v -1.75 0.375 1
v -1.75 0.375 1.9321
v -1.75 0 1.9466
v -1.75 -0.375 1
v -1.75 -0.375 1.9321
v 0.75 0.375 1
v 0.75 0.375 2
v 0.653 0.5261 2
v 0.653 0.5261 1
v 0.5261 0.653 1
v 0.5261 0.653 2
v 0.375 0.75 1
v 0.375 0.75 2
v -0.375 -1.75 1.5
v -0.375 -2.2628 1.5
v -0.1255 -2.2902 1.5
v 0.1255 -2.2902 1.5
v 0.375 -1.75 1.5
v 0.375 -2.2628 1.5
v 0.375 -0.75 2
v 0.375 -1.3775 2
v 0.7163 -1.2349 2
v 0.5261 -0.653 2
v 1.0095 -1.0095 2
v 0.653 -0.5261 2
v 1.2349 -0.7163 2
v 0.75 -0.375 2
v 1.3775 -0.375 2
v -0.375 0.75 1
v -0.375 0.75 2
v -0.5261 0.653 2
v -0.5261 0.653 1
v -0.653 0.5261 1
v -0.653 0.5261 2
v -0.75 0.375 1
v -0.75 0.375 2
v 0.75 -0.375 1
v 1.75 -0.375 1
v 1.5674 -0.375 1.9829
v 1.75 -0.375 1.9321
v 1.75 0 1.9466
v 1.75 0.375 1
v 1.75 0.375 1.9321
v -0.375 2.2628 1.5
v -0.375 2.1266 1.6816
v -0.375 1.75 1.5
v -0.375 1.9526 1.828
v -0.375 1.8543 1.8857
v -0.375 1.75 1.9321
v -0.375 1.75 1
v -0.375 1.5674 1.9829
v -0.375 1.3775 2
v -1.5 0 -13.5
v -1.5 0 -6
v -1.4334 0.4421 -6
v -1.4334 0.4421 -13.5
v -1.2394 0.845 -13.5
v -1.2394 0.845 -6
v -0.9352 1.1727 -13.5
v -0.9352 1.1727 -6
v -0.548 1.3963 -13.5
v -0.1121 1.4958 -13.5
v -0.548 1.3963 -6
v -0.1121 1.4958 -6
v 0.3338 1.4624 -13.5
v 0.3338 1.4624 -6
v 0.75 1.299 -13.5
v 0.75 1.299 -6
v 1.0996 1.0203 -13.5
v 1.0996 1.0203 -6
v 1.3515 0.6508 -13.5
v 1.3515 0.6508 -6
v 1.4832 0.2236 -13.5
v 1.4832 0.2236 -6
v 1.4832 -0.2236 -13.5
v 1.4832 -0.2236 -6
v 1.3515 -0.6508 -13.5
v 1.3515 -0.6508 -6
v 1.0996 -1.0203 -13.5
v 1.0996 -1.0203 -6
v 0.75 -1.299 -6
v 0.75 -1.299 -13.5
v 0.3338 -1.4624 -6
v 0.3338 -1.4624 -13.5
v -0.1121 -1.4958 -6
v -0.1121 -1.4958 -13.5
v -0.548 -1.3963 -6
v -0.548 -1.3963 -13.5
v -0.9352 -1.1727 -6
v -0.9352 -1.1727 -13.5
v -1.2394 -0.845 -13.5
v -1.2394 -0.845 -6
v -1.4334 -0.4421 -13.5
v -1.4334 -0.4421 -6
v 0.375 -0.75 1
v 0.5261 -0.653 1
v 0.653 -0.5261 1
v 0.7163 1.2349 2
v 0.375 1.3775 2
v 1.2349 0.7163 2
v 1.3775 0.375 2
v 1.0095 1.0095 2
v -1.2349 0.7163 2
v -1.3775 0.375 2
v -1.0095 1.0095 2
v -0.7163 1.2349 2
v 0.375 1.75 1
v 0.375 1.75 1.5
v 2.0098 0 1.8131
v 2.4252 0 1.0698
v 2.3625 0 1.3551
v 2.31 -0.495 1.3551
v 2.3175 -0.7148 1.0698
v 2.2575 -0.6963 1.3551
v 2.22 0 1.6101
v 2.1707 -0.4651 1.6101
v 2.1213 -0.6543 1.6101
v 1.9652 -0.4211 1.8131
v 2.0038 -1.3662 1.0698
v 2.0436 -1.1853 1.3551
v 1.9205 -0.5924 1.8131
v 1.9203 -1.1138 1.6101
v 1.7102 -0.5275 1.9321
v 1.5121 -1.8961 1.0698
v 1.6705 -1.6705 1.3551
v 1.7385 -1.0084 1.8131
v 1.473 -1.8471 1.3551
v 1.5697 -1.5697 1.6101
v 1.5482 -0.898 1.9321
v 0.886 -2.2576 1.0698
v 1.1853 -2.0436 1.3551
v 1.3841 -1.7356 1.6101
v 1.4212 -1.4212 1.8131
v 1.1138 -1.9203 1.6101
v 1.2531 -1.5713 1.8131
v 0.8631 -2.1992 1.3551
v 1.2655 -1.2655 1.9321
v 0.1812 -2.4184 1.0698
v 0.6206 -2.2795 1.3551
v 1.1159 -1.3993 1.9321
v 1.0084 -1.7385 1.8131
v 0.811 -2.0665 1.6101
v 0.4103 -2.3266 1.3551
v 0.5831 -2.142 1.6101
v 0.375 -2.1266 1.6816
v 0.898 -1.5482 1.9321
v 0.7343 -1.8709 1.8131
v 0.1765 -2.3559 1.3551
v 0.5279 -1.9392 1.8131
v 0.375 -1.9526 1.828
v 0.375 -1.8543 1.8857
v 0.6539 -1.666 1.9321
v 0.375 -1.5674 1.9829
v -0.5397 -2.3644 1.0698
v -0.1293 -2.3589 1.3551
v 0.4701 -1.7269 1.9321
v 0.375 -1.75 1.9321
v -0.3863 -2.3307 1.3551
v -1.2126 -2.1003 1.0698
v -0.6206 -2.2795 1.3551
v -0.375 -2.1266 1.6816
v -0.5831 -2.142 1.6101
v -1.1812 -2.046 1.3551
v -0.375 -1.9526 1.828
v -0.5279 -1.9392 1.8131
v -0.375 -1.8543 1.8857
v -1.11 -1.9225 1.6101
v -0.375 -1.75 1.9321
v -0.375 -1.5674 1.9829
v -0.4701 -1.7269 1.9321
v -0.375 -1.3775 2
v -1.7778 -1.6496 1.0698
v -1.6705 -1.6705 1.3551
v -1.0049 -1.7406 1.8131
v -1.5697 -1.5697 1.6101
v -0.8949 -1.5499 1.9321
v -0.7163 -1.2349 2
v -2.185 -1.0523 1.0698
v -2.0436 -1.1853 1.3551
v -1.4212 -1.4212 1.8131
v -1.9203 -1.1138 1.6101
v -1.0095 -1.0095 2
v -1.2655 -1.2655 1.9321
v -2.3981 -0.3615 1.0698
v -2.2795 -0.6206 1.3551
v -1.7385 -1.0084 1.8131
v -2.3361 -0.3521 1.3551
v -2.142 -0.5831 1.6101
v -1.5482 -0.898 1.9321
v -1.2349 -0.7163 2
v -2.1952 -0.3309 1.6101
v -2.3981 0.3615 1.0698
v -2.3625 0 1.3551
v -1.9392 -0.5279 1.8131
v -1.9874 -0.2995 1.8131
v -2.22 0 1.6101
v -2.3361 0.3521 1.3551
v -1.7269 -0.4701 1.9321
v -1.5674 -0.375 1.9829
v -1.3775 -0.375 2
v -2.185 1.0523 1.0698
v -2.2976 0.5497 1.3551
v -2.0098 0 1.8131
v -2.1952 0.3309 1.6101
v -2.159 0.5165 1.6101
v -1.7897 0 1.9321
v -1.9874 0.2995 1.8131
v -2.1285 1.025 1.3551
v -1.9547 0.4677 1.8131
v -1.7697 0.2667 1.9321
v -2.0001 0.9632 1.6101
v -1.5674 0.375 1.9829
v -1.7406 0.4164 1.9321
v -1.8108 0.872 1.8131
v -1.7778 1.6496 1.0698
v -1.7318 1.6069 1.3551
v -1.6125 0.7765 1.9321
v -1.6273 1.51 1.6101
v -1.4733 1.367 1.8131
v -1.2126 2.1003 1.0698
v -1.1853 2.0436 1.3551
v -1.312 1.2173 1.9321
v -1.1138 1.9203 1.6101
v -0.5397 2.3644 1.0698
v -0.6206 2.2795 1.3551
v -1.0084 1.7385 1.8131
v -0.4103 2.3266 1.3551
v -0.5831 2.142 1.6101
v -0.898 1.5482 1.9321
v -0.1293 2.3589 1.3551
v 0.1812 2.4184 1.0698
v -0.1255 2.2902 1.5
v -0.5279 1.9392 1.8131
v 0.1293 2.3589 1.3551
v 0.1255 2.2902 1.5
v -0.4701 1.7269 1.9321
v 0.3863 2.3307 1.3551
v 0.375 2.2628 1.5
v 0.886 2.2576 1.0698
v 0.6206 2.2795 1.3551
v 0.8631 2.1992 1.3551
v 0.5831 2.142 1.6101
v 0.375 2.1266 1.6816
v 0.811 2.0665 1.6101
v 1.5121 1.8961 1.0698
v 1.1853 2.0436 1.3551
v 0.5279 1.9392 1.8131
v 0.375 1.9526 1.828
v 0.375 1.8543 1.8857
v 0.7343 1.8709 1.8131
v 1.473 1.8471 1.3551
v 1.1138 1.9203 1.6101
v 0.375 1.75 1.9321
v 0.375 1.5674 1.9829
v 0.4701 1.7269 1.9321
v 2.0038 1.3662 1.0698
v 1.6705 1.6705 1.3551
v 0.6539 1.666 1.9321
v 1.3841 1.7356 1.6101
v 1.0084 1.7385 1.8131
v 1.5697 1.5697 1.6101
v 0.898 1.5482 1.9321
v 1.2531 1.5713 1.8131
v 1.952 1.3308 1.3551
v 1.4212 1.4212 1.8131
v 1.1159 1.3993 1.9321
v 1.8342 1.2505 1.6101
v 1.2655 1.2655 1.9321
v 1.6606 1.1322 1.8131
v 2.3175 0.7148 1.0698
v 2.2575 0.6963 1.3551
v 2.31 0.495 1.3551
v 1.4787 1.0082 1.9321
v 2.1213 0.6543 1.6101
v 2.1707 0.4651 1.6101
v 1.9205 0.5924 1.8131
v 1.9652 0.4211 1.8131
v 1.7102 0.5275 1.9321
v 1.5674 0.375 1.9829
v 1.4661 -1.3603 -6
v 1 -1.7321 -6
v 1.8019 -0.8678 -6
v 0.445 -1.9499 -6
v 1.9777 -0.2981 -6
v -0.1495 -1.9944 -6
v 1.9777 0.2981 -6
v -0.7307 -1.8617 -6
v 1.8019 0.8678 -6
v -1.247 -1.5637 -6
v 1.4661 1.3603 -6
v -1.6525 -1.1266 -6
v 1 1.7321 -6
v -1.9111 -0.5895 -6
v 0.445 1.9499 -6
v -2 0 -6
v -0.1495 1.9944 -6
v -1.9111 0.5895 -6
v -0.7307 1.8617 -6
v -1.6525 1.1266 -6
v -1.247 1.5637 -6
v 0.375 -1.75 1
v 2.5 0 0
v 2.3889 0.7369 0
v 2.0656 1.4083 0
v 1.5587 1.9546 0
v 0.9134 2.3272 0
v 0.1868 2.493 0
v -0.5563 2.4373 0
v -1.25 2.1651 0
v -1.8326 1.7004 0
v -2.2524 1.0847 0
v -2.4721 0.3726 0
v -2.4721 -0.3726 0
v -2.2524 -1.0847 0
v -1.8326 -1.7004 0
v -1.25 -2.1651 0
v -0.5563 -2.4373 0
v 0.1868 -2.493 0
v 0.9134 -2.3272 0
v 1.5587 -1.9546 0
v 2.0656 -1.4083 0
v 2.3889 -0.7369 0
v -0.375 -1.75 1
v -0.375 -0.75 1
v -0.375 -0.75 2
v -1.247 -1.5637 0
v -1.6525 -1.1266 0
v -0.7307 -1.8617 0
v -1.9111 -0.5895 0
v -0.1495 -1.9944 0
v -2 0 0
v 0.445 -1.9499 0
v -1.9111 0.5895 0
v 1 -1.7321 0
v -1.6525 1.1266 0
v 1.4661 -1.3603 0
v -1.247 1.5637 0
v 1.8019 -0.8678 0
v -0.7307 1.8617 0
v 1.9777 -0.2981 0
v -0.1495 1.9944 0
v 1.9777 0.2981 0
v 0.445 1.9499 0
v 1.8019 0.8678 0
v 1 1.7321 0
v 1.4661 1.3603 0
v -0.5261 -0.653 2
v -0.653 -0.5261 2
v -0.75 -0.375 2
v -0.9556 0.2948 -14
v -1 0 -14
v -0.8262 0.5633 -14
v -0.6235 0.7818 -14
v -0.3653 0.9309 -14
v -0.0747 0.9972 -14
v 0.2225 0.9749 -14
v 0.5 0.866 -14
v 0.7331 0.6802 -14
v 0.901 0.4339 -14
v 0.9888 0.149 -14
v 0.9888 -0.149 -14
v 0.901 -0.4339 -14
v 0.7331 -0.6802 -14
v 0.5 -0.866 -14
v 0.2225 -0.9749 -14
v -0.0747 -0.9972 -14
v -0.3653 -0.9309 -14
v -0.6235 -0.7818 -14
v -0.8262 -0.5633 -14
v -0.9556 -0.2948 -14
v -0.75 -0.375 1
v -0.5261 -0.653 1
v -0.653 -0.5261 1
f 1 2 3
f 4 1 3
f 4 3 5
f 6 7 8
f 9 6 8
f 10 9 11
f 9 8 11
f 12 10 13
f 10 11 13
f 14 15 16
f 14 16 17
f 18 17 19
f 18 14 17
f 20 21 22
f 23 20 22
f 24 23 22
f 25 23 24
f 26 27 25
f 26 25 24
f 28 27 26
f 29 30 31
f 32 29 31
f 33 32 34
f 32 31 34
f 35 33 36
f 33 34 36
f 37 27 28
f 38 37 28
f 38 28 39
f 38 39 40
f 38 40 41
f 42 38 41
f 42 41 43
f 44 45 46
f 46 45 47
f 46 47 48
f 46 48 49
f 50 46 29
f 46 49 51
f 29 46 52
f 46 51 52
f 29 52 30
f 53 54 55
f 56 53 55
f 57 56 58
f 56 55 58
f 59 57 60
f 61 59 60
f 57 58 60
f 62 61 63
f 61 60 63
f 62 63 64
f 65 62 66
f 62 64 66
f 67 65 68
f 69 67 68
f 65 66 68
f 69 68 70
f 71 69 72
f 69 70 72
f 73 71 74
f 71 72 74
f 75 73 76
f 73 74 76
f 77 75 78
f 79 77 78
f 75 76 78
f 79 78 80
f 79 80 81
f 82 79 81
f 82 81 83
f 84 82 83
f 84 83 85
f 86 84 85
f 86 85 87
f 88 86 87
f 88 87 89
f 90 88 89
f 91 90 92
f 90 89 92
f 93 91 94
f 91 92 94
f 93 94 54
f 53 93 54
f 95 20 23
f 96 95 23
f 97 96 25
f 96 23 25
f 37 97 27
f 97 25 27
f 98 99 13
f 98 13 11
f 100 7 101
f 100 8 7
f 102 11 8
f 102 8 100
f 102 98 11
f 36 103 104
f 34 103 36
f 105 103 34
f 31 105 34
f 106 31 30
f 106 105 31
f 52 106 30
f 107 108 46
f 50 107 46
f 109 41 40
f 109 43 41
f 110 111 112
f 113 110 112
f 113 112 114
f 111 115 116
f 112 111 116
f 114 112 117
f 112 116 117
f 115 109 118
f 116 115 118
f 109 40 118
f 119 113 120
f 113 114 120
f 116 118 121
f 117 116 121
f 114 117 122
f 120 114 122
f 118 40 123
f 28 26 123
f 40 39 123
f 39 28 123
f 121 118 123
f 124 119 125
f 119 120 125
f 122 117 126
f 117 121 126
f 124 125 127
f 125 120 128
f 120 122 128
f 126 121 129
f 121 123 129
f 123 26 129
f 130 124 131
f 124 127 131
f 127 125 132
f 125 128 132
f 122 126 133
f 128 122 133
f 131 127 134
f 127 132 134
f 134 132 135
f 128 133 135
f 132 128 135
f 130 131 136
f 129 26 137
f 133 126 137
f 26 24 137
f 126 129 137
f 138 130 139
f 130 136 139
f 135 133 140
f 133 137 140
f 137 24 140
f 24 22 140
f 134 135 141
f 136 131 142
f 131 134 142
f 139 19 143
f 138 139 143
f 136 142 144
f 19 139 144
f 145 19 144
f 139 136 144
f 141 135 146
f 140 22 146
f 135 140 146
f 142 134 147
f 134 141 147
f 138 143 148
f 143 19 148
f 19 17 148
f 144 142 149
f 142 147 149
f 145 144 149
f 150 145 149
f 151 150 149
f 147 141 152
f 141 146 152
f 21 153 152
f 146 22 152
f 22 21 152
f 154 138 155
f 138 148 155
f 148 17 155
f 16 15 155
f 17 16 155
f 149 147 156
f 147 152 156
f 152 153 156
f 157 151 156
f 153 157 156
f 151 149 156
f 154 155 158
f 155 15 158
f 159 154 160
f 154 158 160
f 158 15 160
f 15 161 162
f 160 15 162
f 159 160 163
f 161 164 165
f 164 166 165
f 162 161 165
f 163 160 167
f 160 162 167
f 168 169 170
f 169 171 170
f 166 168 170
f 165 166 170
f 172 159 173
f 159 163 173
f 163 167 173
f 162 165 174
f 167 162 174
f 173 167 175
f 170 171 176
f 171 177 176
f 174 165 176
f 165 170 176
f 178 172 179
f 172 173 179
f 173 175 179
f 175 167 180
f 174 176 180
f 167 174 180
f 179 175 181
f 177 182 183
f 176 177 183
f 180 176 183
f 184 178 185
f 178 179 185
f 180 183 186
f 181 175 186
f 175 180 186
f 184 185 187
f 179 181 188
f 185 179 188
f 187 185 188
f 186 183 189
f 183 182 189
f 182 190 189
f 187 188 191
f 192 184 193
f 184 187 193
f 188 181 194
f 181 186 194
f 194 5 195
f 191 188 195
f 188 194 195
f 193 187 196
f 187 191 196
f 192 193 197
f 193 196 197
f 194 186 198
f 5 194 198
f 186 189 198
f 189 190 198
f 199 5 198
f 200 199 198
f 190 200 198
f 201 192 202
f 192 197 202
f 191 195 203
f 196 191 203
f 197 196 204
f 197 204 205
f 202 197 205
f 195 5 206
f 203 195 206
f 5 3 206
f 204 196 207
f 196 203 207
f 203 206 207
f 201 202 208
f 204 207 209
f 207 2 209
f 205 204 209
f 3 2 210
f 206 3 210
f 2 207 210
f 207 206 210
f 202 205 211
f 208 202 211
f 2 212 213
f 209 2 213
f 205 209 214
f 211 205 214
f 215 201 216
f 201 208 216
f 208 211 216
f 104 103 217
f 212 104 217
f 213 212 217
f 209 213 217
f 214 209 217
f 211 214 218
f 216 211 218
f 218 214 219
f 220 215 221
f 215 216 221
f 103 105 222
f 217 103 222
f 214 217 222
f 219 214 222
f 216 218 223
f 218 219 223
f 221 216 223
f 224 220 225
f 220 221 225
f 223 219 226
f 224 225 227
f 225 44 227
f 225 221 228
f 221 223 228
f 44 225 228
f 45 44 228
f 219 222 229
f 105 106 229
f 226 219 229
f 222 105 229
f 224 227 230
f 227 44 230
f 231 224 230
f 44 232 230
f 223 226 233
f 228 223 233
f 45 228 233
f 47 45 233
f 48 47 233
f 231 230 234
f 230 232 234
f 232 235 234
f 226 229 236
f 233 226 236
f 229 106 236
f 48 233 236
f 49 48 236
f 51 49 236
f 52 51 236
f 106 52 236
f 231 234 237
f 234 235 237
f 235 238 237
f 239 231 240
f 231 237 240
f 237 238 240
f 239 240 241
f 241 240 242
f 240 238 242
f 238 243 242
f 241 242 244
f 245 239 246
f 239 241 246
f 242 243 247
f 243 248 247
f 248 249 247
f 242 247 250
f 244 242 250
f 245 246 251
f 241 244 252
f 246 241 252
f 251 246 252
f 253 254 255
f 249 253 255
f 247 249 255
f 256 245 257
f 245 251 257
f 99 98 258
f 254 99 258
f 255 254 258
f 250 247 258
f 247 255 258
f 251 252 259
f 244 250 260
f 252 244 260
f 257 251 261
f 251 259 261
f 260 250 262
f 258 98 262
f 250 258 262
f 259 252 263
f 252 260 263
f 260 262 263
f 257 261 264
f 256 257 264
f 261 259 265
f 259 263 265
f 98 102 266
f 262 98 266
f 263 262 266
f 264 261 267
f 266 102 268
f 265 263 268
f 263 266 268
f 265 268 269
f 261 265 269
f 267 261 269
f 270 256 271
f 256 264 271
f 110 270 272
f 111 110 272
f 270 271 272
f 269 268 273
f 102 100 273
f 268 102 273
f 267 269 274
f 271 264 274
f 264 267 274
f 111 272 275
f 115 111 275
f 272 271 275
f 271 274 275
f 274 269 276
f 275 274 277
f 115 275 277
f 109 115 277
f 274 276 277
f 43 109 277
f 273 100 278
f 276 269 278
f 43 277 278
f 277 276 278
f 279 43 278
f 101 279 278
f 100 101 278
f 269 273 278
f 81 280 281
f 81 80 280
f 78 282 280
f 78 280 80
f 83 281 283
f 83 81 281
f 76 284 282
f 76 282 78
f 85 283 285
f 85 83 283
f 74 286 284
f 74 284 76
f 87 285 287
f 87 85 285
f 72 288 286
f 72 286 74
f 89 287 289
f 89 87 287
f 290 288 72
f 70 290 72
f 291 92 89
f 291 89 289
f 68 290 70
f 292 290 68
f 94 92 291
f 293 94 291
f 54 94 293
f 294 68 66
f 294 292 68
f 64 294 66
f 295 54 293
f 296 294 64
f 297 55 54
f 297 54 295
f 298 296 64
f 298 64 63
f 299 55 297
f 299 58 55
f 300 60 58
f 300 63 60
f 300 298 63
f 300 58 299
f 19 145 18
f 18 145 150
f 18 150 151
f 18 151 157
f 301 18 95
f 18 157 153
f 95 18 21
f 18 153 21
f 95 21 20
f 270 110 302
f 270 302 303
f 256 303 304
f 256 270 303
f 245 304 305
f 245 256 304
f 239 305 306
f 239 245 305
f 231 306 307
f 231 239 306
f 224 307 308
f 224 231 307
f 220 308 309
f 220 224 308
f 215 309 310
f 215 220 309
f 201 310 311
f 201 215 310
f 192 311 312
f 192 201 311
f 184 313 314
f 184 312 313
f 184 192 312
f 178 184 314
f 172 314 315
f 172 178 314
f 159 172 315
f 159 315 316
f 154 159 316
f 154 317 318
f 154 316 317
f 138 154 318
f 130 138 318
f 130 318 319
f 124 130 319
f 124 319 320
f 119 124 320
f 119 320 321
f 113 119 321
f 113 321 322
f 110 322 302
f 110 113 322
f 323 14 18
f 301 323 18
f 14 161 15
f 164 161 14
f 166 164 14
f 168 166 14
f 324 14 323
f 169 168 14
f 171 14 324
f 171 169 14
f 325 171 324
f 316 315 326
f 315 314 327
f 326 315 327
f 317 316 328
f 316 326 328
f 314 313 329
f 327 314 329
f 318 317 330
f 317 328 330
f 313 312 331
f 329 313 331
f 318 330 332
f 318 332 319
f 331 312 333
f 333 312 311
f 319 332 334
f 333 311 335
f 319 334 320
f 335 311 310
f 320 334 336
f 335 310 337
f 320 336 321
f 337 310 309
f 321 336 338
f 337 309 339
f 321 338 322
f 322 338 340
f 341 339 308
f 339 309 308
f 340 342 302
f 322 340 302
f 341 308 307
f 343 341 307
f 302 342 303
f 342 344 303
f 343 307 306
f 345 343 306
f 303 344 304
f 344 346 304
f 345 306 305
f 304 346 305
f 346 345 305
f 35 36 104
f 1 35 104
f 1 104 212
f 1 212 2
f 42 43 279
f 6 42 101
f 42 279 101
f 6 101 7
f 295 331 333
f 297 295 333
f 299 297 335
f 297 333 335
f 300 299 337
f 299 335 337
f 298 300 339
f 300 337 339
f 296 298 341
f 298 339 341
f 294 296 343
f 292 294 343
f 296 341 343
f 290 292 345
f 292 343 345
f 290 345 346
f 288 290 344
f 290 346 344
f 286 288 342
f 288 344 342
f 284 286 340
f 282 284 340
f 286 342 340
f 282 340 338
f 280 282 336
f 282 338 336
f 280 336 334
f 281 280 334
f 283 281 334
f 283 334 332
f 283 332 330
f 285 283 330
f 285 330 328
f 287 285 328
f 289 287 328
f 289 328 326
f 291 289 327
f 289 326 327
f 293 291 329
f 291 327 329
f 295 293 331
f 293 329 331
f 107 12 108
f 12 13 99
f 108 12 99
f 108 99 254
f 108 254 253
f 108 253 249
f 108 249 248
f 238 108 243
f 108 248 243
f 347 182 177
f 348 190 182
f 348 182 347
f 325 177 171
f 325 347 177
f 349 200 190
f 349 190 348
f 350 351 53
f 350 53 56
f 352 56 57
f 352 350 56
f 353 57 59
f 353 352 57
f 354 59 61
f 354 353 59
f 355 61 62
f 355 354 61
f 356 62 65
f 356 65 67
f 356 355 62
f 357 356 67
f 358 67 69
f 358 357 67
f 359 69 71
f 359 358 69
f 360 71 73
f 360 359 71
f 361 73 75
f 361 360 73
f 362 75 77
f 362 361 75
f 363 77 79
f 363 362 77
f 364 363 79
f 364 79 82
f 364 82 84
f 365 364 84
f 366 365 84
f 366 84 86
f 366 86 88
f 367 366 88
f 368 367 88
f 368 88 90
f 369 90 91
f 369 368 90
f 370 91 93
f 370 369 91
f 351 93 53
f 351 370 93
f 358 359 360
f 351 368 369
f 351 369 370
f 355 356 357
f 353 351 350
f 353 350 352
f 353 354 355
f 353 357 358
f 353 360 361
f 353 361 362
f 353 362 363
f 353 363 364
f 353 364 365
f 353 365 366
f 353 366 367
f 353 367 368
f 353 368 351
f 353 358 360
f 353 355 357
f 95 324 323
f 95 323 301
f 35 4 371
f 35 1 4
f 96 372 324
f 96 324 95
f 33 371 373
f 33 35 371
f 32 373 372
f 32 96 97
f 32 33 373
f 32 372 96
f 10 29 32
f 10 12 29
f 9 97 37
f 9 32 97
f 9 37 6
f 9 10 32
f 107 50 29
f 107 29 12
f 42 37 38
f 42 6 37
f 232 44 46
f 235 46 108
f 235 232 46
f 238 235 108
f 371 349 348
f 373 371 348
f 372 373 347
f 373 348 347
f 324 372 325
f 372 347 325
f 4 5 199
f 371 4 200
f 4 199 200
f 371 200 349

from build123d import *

# Parameters (mm, degrees)
ESQUISSE1_R             = 2.5
BASE_EXTRUSION_DEPTH    = 2
BASE_EXTRUSION_TAPER    = 4
CONG_1_R                = 1
ESQUISSE2_R             = 2
BOSS_EXTRU_1_DEPTH      = 6
ESQUISSE3_R             = 1.5
BOSS_EXTRU_2_DEPTH      = 8
CHANFREIN1_SIZE         = 0.5
ENL_V_MAT_EXTRU_1_DEPTH = 1
ESQUISSE5_W             = 0.75
ESQUISSE5_H             = 5.593358395
ENL_V_MAT_EXTRU_2_DEPTH = 0.5


with BuildPart() as part:
    # Esquisse1 → Base-Extrusion (new body)
    with BuildSketch(Plane.XY):
        Circle(ESQUISSE1_R)
    extrude(amount=BASE_EXTRUSION_DEPTH, taper=BASE_EXTRUSION_TAPER)

    # Congé1
    cong_1_edges = [part.edges().sort_by_distance(p)[0] for p in [
        (-2.360146376, 0, 2),
    ]]
    fillet(cong_1_edges, radius=CONG_1_R)

    # Esquisse2 → Boss.-Extru.1 (add)
    with BuildSketch(Plane(origin=(0, 0, 0), x_dir=(-1, 0, 0), z_dir=(0, 0, -1))):
        Circle(ESQUISSE2_R)
    extrude(amount=BOSS_EXTRU_1_DEPTH)

    # Esquisse3 → Boss.-Extru.2 (add)
    with BuildSketch(Plane(origin=(0, 0, -6), x_dir=(-1, 0, 0), z_dir=(0, 0, -1))):
        Circle(ESQUISSE3_R)
    extrude(amount=BOSS_EXTRU_2_DEPTH)

    # Chanfrein1
    chanfrein1_edges = [part.edges().sort_by_distance(p)[0] for p in [
        (1.5, 0, -14),
    ]]
    chamfer(chanfrein1_edges, length=CHANFREIN1_SIZE)

    # Esquisse4 → Enlèv. mat.-Extru.1 (cut)
    with BuildSketch(Plane.XY.offset(2)):
        with BuildLine():
            Line((-1.75, -0.375), (-0.75, -0.375))
            ThreePointArc((-0.75, -0.375), (-0.592927061, -0.592927061), (-0.375, -0.75))
            Line((-0.375, -0.75), (-0.375, -1.75))
            Line((-0.375, -1.75), (0.375, -1.75))
            Line((0.375, -1.75), (0.375, -0.75))
            ThreePointArc((0.375, -0.75), (0.592927061, -0.592927061), (0.75, -0.375))
            Line((0.75, -0.375), (1.75, -0.375))
            Line((1.75, -0.375), (1.75, 0.375))
            Line((1.75, 0.375), (0.75, 0.375))
            ThreePointArc((0.75, 0.375), (0.592927061, 0.592927061), (0.375, 0.75))
            Line((0.375, 0.75), (0.375, 1.75))
            Line((0.375, 1.75), (-0.375, 1.75))
            Line((-0.375, 1.75), (-0.375, 0.75))
            ThreePointArc((-0.375, 0.75), (-0.592927061, 0.592927061), (-0.75, 0.375))
            Line((-0.75, 0.375), (-1.75, 0.375))
            Line((-1.75, 0.375), (-1.75, -0.375))
        make_face()
    extrude(amount=-ENL_V_MAT_EXTRU_1_DEPTH, mode=Mode.SUBTRACT)

    # Esquisse5 → Enlèv. mat.-Extru.2 (cut)
    with BuildSketch(Plane.XY.offset(2)):
        with Locations((0, -0.203384651)):
            Rectangle(ESQUISSE5_W, ESQUISSE5_H)
    extrude(amount=-ENL_V_MAT_EXTRU_2_DEPTH, mode=Mode.SUBTRACT)


solid = part.part
